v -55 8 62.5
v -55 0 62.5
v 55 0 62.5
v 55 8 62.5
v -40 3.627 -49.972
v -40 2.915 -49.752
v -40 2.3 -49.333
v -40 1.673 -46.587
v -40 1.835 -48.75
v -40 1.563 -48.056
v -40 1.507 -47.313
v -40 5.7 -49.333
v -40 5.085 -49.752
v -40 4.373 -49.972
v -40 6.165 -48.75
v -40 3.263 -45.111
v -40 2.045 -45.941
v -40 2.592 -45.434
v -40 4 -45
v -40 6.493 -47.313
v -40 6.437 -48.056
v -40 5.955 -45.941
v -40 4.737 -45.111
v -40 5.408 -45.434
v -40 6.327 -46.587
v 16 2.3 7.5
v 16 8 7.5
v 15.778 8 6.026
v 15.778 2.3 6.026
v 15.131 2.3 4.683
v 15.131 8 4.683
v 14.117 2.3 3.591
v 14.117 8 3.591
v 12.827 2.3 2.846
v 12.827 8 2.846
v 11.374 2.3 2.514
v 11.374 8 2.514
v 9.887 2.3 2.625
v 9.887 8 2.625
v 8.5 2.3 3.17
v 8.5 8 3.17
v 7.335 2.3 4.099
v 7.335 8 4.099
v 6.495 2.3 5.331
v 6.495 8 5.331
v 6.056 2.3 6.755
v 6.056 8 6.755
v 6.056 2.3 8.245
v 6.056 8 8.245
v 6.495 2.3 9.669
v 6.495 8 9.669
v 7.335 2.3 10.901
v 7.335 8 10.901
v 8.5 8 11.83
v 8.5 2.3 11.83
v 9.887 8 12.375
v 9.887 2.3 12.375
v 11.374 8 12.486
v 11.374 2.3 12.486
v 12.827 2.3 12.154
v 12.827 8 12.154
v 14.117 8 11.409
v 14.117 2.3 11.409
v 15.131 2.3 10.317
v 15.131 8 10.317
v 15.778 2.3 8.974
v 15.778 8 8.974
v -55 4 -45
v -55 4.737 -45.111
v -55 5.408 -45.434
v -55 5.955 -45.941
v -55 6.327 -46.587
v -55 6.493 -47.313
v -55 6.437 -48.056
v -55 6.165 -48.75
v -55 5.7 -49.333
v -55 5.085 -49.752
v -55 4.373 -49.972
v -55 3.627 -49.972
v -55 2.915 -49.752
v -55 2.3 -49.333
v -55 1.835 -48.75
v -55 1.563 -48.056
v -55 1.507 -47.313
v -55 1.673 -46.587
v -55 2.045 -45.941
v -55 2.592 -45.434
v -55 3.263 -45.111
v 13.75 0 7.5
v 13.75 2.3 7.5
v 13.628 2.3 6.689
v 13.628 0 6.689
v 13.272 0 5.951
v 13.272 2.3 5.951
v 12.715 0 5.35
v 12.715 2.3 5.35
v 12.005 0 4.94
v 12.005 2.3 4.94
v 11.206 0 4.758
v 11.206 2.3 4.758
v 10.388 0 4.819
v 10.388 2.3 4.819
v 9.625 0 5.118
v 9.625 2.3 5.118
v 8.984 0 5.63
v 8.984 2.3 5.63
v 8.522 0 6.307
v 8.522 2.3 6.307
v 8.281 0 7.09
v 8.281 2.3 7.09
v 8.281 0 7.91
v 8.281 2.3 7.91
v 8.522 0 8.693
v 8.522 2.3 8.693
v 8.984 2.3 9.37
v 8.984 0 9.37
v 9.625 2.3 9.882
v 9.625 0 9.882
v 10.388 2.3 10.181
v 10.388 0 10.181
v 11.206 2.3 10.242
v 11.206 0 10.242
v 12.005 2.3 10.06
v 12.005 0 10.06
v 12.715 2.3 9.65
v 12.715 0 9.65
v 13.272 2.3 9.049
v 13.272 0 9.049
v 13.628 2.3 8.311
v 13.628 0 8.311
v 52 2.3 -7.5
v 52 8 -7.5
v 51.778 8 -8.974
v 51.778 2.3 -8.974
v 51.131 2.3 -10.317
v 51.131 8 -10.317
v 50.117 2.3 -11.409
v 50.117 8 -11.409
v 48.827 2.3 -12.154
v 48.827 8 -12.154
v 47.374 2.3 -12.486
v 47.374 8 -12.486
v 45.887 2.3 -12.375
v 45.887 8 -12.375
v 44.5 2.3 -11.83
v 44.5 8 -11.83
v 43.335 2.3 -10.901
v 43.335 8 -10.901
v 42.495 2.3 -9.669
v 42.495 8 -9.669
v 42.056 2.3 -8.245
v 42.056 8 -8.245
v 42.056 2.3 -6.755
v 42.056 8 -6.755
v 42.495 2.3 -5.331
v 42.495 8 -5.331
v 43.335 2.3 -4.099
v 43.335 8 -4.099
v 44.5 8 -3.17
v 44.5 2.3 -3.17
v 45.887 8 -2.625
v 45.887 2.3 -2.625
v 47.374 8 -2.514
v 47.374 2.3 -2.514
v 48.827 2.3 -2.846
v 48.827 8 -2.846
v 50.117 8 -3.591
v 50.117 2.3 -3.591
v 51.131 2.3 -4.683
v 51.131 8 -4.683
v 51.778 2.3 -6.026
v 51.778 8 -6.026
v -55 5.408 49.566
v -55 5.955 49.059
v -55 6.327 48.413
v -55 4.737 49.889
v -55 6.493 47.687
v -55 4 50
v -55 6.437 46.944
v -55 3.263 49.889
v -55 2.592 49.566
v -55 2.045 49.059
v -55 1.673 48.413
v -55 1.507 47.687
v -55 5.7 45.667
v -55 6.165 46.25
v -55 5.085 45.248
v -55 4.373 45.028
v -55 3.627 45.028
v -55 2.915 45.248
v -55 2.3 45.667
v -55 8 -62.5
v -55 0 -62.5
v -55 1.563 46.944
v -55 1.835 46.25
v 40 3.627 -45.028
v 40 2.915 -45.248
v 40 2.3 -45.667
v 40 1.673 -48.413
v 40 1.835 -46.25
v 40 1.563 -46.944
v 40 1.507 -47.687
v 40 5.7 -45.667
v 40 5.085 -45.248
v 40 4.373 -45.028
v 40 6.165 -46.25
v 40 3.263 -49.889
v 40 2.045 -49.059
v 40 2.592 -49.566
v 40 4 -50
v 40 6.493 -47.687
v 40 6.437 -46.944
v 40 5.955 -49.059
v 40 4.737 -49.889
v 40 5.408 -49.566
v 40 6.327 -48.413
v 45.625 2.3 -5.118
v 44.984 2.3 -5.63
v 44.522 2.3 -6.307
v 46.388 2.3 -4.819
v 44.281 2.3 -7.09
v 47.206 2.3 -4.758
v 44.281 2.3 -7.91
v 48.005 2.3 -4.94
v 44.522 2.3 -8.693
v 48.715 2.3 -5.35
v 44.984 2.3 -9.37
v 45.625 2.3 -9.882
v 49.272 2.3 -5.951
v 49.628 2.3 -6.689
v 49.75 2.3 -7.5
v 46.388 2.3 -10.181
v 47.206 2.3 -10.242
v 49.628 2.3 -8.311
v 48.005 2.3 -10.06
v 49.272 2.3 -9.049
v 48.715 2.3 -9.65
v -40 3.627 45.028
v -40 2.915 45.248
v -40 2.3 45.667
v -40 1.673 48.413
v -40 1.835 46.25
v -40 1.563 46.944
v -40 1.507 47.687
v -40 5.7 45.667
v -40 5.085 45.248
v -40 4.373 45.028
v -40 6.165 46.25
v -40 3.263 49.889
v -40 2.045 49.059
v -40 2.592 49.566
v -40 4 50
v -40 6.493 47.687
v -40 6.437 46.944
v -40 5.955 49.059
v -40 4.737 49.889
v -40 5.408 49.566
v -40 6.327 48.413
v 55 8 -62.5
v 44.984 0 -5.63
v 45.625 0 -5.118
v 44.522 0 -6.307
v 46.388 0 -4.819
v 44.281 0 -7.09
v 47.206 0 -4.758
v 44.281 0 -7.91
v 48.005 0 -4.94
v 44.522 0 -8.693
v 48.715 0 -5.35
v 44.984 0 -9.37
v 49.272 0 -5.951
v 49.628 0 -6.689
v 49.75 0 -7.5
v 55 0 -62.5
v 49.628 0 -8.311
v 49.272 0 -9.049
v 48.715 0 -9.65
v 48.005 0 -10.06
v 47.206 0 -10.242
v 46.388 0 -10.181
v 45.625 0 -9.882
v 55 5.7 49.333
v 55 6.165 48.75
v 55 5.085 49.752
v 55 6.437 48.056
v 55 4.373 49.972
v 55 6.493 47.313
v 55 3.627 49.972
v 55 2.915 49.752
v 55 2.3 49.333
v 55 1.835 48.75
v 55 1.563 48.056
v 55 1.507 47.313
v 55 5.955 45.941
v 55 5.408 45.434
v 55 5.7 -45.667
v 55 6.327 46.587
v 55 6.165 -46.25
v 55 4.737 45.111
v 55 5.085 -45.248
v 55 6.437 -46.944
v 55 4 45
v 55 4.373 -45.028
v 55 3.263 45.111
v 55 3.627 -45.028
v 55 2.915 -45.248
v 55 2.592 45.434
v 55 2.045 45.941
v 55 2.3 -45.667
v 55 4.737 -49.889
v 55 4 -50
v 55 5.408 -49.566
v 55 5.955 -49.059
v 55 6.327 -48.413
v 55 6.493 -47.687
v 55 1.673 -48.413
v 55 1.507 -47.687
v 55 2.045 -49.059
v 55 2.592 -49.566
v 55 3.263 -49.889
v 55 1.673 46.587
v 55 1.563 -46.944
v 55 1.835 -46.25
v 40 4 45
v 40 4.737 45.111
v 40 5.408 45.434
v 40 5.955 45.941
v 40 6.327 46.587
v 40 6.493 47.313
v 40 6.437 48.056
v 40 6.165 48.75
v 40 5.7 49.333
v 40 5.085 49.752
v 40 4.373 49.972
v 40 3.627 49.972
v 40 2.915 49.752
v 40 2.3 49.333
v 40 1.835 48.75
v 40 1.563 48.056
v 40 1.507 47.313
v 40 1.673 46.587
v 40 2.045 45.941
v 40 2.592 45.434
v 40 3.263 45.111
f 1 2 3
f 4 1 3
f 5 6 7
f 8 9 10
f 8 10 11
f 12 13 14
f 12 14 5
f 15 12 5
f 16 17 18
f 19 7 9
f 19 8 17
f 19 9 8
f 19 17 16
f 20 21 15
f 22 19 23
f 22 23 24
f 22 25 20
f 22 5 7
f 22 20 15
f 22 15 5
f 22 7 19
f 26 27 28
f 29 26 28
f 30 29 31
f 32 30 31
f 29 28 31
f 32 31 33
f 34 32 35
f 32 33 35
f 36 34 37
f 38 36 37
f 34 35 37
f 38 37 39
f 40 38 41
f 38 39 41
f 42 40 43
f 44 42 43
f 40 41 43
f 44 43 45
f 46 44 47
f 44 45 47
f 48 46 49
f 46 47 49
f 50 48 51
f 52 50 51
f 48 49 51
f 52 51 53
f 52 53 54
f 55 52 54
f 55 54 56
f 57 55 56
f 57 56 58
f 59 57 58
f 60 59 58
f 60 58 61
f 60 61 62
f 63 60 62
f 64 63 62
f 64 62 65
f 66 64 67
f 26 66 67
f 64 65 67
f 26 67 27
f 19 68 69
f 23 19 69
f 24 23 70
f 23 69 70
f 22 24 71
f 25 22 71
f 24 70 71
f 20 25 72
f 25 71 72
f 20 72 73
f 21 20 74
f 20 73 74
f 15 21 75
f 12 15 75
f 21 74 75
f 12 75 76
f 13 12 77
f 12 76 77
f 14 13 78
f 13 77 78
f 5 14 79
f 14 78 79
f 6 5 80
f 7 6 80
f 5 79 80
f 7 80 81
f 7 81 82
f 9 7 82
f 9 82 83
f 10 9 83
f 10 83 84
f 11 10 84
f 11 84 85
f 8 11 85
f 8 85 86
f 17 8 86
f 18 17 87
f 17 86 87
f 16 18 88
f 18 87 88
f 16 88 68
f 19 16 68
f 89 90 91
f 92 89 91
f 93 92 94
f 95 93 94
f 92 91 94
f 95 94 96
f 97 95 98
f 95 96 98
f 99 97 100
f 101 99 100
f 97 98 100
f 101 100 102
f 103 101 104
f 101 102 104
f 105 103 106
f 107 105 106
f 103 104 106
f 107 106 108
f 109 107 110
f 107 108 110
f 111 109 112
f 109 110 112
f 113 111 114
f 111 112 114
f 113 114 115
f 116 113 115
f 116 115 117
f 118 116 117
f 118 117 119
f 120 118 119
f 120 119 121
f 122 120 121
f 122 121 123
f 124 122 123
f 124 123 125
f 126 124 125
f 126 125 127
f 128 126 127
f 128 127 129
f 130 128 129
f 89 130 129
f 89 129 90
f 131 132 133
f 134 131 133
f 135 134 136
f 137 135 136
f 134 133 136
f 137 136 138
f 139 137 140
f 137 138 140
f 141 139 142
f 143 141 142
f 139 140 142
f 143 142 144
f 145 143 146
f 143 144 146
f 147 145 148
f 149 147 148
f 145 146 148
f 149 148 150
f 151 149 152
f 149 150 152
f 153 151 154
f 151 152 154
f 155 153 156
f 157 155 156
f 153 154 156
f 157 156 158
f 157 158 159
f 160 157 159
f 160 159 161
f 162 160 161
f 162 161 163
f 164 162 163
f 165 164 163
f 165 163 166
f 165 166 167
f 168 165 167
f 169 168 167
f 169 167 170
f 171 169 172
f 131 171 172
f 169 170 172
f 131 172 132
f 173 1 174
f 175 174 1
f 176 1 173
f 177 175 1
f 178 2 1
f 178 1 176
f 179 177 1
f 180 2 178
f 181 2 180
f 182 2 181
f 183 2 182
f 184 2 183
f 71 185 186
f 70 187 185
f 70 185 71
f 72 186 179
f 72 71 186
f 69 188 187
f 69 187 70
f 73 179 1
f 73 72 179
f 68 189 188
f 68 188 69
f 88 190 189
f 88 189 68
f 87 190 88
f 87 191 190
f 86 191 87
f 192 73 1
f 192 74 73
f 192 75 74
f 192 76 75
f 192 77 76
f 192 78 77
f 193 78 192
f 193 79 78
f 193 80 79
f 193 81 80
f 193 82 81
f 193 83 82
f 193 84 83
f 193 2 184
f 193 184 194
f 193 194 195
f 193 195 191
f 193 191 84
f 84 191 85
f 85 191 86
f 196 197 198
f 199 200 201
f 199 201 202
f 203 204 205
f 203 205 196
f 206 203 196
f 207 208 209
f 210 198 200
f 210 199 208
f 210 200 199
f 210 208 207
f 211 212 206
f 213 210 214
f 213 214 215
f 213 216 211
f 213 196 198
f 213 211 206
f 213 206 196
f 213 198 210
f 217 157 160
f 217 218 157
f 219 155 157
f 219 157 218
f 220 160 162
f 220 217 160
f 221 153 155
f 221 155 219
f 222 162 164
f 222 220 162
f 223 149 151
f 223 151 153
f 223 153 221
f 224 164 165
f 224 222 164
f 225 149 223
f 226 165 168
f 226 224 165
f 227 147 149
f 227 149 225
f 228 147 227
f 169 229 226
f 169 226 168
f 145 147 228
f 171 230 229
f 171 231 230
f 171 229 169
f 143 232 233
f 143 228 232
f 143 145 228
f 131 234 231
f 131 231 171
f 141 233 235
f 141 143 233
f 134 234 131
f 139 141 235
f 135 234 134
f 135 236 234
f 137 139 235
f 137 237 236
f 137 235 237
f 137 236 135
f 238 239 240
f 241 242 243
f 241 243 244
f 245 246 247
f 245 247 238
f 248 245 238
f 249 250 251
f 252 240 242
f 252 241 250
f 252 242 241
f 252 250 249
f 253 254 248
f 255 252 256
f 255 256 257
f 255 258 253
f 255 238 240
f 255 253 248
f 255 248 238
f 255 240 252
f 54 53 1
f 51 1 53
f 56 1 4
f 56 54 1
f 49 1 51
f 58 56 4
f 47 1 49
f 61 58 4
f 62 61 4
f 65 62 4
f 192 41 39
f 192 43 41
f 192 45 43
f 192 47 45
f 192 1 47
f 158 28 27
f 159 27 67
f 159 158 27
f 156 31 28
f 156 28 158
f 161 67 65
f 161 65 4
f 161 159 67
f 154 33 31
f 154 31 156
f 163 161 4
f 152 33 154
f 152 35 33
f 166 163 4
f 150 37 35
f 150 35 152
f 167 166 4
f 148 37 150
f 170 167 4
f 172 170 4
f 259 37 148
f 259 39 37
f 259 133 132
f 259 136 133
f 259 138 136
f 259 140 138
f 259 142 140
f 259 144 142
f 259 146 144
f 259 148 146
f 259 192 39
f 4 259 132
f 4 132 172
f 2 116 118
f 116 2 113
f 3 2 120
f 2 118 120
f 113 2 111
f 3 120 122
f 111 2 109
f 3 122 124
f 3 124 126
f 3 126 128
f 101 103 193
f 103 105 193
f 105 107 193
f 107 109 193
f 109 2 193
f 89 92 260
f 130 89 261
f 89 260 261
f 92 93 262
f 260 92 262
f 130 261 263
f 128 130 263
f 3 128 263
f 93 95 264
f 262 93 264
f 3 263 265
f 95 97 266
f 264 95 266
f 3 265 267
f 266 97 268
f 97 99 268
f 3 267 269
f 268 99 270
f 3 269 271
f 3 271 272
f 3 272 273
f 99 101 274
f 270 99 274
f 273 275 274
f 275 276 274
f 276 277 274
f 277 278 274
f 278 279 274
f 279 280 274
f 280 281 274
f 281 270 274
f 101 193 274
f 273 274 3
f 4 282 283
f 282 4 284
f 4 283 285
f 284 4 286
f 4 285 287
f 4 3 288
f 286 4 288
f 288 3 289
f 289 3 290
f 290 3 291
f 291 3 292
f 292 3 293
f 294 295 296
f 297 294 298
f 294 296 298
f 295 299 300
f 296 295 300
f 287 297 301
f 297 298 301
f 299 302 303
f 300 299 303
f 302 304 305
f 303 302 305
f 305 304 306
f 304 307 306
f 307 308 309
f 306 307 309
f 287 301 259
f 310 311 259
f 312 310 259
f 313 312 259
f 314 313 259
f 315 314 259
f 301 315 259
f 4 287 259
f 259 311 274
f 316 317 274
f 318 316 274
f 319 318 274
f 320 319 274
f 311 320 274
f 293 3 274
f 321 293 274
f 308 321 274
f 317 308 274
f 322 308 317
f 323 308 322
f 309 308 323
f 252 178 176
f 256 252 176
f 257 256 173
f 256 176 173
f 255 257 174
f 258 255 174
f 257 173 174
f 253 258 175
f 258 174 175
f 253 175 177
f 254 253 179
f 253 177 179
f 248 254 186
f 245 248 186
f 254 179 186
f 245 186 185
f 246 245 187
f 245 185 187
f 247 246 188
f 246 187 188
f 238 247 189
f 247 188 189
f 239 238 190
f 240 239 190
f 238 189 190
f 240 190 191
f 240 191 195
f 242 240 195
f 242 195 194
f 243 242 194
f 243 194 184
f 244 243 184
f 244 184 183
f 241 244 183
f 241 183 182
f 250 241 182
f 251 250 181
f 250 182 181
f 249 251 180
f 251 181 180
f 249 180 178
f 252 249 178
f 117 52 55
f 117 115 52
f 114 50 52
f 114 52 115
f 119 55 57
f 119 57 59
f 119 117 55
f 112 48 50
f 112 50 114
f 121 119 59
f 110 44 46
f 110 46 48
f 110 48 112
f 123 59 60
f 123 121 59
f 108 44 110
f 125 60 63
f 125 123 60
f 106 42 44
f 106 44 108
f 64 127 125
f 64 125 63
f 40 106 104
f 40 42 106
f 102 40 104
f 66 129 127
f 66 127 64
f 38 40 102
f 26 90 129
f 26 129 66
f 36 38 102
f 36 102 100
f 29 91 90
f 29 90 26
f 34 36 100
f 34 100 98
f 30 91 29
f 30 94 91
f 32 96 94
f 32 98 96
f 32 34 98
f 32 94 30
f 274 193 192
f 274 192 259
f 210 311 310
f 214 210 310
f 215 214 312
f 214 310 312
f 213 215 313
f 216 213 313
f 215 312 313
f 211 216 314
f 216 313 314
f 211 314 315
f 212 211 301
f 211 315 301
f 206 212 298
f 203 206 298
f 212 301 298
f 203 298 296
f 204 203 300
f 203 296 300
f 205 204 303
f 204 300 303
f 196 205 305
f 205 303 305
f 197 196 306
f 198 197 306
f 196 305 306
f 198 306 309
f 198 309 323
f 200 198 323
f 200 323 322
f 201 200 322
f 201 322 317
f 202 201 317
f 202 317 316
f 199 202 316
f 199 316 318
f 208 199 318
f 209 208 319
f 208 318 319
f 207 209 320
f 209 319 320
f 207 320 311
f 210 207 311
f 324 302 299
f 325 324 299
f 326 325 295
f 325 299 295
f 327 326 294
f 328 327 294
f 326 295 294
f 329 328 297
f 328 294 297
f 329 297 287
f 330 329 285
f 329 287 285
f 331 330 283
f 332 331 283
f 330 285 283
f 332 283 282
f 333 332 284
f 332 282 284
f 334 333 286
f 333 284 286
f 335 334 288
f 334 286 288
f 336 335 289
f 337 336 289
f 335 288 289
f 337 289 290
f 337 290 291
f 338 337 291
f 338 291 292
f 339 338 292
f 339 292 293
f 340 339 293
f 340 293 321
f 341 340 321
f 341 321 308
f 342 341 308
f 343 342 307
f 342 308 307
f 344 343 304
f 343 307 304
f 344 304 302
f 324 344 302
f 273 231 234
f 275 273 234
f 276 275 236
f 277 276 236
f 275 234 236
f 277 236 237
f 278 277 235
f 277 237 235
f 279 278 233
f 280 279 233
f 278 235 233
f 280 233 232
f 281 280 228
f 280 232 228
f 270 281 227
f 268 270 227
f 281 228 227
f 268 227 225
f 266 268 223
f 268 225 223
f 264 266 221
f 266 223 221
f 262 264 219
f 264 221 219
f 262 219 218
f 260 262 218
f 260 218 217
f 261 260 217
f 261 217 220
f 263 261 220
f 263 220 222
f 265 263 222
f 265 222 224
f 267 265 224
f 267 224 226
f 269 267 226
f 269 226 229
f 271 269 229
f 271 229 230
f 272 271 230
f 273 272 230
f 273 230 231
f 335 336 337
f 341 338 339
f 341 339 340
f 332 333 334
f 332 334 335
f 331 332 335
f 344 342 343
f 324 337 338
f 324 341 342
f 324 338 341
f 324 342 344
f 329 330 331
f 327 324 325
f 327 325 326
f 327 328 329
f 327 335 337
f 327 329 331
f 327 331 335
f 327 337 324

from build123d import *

# Parameters (mm, degrees)
SKETCH1_W           = 110
SKETCH1_H           = 125
BOSS_EXTRUDE2_DEPTH = 8
SKETCH2_R           = 2.75
CUT_EXTRUDE1_DEPTH  = 8
SKETCH3_R           = 2.5
CUT_EXTRUDE2_DEPTH  = 15
SKETCH4_R           = 2.5
CUT_EXTRUDE3_DEPTH  = 15
SKETCH5_R           = 5
CUT_EXTRUDE4_DEPTH  = 5.7


with BuildPart() as part:
    # Sketch1 → Boss-Extrude2 (new body)
    with BuildSketch(Plane(origin=(0, 0, 0), x_dir=(1, 0, 0), z_dir=(0, 1, 0))):
        Rectangle(SKETCH1_W, SKETCH1_H)
    extrude(amount=BOSS_EXTRUDE2_DEPTH)

    # Sketch2 → Cut-Extrude1 (cut)
    with BuildSketch(Plane(origin=(0, 8, 0), x_dir=(1, 0, 0), z_dir=(0, 1, 0))):
        with Locations((47, 7.5)):
            Circle(SKETCH2_R)
        with Locations((11, -7.5)):
            Circle(SKETCH2_R)
    extrude(amount=-CUT_EXTRUDE1_DEPTH, mode=Mode.SUBTRACT)

    # Sketch3 → Cut-Extrude2 (cut)
    with BuildSketch(Plane.ZY.offset(55)):
        with Locations((47.5, 4)):
            Circle(SKETCH3_R)
        with Locations((-47.5, 4)):
            Circle(SKETCH3_R)
    extrude(amount=-CUT_EXTRUDE2_DEPTH, mode=Mode.SUBTRACT)

    # Sketch4 → Cut-Extrude3 (cut)
    with BuildSketch(Plane(origin=(55, 0, 0), x_dir=(0, 0, -1), z_dir=(1, 0, 0))):
        with Locations((47.5, 4)):
            Circle(SKETCH4_R)
        with Locations((-47.5, 4)):
            Circle(SKETCH4_R)
    extrude(amount=-CUT_EXTRUDE3_DEPTH, mode=Mode.SUBTRACT)

    # Sketch5 → Cut-Extrude4 (cut)
    with BuildSketch(Plane(origin=(0, 8, 0), x_dir=(1, 0, 0), z_dir=(0, 1, 0))):
        with Locations((11, -7.5)):
            Circle(SKETCH5_R)
        with Locations((47, 7.5)):
            Circle(SKETCH5_R)
    extrude(amount=-CUT_EXTRUDE4_DEPTH, mode=Mode.SUBTRACT)


solid = part.part
